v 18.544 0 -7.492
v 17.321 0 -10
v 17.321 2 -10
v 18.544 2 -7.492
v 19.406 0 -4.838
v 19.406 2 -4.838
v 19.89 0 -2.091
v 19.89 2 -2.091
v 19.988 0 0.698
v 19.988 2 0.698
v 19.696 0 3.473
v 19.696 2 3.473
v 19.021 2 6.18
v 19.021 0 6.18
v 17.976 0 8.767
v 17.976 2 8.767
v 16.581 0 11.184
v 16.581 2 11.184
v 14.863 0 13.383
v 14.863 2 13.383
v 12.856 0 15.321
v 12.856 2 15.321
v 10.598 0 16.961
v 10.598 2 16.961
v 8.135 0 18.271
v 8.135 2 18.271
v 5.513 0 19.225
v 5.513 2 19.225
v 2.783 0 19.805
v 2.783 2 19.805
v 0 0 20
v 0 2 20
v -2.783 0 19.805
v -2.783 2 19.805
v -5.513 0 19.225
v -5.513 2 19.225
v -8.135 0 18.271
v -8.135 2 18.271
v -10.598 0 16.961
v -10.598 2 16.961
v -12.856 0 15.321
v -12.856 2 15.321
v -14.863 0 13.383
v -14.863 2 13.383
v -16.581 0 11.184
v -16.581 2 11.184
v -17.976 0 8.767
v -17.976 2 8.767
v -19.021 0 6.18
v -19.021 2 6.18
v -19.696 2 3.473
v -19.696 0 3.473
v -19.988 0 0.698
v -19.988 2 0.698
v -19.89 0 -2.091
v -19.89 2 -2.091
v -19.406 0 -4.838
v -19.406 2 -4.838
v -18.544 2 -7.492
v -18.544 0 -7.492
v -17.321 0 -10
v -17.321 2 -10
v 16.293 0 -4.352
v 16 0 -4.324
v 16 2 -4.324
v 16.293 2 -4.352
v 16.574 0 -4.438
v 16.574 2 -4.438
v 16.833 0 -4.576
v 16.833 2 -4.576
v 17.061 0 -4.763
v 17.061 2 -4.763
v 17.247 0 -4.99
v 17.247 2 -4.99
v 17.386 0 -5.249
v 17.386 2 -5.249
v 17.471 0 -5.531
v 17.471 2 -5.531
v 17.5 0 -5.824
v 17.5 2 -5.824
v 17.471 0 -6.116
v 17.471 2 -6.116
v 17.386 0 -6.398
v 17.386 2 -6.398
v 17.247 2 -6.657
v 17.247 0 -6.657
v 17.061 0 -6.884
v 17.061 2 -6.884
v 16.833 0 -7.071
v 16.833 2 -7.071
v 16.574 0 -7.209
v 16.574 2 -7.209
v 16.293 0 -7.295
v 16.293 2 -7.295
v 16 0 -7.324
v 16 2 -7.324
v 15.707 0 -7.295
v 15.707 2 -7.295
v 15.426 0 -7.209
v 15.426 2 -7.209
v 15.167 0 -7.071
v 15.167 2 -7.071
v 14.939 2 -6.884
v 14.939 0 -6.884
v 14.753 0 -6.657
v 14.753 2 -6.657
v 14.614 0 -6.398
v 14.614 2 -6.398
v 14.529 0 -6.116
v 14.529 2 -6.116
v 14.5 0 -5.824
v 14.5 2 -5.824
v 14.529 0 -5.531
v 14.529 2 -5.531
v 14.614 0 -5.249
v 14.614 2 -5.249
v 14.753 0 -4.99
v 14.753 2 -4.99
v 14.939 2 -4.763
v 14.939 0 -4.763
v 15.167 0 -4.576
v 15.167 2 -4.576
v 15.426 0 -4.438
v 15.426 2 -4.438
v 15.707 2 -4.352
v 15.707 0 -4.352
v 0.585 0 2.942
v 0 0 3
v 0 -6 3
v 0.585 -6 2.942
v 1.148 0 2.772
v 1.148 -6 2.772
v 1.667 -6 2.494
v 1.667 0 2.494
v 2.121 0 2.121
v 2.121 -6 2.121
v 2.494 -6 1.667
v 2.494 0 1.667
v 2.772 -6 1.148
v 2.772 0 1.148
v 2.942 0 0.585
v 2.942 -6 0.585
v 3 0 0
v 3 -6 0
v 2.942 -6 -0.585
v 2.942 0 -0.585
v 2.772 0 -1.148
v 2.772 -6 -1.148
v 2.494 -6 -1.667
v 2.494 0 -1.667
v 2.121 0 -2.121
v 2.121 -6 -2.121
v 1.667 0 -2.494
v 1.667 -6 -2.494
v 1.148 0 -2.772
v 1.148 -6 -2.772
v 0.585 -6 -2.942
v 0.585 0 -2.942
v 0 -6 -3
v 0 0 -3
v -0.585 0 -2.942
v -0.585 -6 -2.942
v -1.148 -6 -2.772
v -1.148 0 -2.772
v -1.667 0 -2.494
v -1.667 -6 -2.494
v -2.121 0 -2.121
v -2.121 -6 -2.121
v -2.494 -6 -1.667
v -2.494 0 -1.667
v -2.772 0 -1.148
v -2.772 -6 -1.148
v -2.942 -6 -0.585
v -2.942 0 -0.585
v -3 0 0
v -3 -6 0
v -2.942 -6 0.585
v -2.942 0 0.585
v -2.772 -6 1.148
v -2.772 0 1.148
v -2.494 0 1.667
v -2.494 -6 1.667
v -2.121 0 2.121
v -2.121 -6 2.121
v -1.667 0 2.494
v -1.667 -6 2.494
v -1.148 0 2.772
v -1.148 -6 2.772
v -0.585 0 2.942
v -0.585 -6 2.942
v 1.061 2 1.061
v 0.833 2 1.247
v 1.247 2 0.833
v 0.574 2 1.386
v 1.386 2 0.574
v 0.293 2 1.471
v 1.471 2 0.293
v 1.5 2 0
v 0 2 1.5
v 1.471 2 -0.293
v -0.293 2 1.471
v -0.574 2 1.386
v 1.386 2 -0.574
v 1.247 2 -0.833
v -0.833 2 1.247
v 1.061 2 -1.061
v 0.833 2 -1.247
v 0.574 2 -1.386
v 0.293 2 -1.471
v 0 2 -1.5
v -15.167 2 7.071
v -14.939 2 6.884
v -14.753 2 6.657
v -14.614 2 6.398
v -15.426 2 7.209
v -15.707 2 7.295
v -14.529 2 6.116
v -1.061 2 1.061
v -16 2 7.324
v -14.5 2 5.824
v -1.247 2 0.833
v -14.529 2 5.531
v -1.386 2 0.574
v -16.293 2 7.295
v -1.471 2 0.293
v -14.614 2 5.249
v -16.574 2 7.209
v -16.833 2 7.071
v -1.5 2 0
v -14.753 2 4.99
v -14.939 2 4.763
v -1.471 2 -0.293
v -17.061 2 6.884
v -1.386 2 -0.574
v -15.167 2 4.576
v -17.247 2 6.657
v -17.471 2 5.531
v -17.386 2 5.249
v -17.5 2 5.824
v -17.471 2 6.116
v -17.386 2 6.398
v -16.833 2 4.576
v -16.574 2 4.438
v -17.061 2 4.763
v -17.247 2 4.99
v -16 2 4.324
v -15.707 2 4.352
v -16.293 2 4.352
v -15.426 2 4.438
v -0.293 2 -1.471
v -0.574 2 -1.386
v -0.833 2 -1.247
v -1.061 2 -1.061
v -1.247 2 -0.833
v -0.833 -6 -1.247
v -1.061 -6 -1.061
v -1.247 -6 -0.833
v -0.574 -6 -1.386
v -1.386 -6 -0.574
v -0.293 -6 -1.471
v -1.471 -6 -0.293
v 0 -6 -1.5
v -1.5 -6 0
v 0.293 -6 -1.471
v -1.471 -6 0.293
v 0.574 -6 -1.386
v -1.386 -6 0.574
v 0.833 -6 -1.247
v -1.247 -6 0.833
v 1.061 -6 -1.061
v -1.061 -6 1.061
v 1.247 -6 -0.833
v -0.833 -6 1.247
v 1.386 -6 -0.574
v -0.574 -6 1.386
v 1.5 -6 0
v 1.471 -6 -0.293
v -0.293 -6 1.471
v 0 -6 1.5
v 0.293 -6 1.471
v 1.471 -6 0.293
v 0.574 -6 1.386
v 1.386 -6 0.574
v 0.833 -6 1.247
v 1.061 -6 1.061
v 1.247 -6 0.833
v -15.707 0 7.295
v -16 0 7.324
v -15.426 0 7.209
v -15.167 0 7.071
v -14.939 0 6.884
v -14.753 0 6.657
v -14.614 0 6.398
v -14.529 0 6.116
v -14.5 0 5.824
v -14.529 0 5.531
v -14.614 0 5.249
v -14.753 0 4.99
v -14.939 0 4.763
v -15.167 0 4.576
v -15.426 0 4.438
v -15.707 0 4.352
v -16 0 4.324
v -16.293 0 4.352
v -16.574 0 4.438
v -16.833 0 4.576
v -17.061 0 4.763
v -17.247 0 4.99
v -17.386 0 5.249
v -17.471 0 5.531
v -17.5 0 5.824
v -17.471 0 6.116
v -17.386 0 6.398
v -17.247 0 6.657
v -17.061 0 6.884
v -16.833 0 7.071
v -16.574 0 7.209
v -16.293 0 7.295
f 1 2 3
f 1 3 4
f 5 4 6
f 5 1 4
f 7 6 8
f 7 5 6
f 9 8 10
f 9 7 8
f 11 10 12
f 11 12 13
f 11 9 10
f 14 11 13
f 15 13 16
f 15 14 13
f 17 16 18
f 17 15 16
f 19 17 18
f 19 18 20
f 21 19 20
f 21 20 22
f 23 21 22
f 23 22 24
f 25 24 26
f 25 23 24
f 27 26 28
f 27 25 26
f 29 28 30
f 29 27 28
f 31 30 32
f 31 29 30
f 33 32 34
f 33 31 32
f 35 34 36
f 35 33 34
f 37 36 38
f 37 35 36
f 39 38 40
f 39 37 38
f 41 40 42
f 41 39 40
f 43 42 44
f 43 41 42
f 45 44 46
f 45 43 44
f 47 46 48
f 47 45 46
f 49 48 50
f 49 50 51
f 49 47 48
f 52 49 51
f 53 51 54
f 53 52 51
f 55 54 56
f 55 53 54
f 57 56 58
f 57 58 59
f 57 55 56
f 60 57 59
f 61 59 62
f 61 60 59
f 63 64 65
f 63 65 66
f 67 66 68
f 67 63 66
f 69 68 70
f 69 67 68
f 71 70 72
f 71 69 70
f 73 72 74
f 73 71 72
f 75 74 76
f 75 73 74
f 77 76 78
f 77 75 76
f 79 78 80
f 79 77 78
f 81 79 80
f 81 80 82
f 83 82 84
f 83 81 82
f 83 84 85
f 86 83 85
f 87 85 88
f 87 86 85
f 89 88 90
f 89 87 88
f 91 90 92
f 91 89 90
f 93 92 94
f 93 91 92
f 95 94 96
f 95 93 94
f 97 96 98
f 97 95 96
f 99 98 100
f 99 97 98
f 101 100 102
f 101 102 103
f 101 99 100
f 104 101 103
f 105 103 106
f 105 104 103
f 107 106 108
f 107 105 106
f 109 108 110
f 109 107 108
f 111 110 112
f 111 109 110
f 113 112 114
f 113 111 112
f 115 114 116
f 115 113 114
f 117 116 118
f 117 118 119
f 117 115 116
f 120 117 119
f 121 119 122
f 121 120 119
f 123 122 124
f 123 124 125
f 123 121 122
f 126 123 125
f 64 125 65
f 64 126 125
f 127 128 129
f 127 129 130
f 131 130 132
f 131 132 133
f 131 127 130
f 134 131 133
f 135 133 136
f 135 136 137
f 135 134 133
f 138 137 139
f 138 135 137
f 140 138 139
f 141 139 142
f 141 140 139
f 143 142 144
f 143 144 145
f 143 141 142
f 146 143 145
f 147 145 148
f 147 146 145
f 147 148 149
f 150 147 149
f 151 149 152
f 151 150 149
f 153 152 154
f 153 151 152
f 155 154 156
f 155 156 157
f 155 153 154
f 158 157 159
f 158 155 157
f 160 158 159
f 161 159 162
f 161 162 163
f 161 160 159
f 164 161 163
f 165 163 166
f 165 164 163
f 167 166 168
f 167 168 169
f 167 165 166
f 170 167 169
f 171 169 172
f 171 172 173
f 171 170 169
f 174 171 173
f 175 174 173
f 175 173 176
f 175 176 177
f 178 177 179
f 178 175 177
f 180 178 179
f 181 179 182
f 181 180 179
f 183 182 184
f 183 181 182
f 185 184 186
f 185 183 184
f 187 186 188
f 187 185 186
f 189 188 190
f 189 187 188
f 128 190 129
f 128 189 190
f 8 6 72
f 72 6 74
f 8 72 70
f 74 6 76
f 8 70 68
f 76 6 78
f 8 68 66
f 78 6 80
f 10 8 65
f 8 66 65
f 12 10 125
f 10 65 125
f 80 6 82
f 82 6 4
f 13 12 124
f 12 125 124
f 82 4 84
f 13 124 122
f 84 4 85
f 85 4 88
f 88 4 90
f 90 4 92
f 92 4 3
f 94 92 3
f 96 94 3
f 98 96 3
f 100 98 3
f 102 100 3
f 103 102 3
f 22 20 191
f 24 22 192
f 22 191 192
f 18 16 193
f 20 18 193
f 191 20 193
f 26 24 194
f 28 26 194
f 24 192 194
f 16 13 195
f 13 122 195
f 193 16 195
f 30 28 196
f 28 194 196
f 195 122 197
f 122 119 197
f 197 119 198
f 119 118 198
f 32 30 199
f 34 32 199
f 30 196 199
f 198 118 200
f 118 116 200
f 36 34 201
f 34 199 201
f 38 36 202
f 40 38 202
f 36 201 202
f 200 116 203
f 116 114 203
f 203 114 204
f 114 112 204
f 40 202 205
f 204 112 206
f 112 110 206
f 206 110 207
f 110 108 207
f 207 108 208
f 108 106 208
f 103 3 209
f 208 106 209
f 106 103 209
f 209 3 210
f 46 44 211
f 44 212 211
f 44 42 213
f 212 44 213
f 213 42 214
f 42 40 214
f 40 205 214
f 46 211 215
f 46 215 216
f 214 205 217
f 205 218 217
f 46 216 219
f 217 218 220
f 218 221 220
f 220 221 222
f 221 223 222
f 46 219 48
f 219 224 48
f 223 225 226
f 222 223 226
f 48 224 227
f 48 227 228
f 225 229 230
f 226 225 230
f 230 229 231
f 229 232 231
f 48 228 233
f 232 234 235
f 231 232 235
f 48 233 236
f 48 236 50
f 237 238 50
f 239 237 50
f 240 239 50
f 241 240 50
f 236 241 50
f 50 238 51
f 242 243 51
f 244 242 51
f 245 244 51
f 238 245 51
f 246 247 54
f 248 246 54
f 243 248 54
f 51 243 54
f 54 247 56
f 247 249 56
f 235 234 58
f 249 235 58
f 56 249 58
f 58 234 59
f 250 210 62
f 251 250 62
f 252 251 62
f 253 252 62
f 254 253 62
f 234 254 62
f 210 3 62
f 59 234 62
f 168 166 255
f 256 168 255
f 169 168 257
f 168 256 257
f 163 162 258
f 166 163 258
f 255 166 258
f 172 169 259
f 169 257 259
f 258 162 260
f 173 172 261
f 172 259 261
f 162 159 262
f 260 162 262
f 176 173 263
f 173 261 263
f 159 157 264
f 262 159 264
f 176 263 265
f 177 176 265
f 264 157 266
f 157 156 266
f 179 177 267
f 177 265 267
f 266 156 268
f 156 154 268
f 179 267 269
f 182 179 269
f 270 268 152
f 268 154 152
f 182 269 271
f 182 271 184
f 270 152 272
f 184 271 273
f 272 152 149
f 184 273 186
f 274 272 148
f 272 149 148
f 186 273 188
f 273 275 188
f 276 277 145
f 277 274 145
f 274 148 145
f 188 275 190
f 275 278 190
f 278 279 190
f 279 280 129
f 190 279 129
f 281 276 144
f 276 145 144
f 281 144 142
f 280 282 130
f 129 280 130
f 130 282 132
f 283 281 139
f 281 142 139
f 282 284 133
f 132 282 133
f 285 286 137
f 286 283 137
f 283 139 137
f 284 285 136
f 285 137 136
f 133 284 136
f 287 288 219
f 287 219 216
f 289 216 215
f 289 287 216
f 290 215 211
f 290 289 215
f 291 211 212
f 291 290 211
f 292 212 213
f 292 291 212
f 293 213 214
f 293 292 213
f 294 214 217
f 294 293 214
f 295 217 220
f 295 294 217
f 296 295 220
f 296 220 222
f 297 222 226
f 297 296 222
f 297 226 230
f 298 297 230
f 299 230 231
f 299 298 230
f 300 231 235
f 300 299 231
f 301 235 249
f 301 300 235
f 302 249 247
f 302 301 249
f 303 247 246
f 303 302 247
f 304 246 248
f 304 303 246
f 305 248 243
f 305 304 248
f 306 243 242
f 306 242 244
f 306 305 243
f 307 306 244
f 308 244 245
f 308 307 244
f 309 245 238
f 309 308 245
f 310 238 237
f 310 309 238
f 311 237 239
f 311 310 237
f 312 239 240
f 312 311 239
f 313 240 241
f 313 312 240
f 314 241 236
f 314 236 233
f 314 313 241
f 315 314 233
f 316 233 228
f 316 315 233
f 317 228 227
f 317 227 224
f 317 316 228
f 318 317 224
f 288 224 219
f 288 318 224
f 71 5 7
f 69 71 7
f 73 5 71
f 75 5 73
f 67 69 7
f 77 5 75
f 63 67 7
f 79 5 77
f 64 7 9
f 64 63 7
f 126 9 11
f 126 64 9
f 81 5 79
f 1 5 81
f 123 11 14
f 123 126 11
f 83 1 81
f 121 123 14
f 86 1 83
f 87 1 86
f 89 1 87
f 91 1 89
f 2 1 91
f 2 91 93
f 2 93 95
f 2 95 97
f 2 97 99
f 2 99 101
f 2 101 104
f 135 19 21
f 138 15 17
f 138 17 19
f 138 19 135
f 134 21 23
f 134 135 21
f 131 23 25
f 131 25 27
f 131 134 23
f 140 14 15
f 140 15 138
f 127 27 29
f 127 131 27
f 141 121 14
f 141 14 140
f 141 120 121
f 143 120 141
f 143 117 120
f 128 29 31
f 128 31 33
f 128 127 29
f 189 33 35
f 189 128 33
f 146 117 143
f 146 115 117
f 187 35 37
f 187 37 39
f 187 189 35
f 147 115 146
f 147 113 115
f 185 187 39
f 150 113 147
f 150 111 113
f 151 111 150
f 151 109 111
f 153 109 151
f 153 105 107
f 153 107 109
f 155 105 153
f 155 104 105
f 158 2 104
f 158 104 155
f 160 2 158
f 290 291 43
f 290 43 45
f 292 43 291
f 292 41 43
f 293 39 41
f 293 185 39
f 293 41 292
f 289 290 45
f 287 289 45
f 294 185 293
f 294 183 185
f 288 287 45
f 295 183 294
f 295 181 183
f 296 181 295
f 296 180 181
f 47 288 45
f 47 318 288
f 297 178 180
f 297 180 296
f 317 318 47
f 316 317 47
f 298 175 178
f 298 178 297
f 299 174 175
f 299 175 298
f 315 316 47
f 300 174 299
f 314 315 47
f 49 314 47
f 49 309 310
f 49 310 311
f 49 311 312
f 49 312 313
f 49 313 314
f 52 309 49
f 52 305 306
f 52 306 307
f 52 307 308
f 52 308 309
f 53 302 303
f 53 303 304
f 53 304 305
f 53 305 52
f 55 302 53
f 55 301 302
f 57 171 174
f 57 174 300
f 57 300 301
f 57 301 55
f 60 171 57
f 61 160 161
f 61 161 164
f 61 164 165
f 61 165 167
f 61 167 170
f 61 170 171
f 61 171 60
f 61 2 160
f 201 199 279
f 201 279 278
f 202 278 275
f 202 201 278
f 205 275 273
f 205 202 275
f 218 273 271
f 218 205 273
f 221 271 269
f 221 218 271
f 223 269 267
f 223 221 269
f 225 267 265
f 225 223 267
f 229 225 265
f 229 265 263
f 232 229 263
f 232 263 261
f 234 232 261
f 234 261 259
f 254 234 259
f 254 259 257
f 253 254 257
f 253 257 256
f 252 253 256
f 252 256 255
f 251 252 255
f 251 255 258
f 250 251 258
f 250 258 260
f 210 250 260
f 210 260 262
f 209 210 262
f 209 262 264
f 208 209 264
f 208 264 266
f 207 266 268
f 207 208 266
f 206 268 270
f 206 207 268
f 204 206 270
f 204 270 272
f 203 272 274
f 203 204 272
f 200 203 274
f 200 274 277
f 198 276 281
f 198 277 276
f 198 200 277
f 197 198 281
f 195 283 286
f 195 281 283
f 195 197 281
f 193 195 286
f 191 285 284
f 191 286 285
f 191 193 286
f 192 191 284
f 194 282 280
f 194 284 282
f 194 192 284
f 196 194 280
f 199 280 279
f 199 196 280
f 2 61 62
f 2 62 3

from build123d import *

# Parameters (mm, degrees)
CROQUIS1_R              = 1.5
SALIENTE_EXTRUIR1_DEPTH = 2
CROQUIS2_R              = 3
CROQUIS2_R_2            = 1.5
SALIENTE_EXTRUIR3_DEPTH = 6
CORTAR_EXTRUIR2_START   = -6
CROQUIS4_R              = 1.5
CORTAR_EXTRUIR2_DEPTH   = 6


with BuildPart() as part:
    # Croquis1 → Saliente-Extruir1 (new body)
    with BuildSketch(Plane(origin=(0, 0, 0), x_dir=(1, 0, 0), z_dir=(0, 1, 0))):
        with BuildLine():
            Line((-17.320508076, 10), (17.320508076, 10))
            ThreePointArc((17.320508076, 10), (0, -20), (-17.320508076, 10))
        make_face()
        with Locations(Location((-16, -5.823523748, 0), (0, 0, 270))):
            Circle(CROQUIS1_R, mode=Mode.SUBTRACT)
        with Locations(Location((16, 5.823523748, 0), (0, 0, 270))):
            Circle(CROQUIS1_R, mode=Mode.SUBTRACT)
    extrude(amount=SALIENTE_EXTRUIR1_DEPTH)

    # Croquis2 → Saliente-Extruir3 (add)
    with BuildSketch(Plane(origin=(0, 0, 0), x_dir=(1, 0, 0), z_dir=(0, 1, 0))):
        with Locations(Location((0, 0, 0), (0, 0, 270))):
            Circle(CROQUIS2_R)
        with Locations(Location((0, 0, 0), (0, 0, 270))):
            Circle(CROQUIS2_R_2, mode=Mode.SUBTRACT)
    extrude(amount=-SALIENTE_EXTRUIR3_DEPTH)

    # Croquis4 → Cortar-Extruir2 (cut)
    with BuildSketch(Plane.XZ.offset(CORTAR_EXTRUIR2_START)):
        with Locations(Location((0, 0, 0), (0, 0, 90))):
            Circle(CROQUIS4_R)
    extrude(amount=CORTAR_EXTRUIR2_DEPTH, mode=Mode.SUBTRACT)


solid = part.part
